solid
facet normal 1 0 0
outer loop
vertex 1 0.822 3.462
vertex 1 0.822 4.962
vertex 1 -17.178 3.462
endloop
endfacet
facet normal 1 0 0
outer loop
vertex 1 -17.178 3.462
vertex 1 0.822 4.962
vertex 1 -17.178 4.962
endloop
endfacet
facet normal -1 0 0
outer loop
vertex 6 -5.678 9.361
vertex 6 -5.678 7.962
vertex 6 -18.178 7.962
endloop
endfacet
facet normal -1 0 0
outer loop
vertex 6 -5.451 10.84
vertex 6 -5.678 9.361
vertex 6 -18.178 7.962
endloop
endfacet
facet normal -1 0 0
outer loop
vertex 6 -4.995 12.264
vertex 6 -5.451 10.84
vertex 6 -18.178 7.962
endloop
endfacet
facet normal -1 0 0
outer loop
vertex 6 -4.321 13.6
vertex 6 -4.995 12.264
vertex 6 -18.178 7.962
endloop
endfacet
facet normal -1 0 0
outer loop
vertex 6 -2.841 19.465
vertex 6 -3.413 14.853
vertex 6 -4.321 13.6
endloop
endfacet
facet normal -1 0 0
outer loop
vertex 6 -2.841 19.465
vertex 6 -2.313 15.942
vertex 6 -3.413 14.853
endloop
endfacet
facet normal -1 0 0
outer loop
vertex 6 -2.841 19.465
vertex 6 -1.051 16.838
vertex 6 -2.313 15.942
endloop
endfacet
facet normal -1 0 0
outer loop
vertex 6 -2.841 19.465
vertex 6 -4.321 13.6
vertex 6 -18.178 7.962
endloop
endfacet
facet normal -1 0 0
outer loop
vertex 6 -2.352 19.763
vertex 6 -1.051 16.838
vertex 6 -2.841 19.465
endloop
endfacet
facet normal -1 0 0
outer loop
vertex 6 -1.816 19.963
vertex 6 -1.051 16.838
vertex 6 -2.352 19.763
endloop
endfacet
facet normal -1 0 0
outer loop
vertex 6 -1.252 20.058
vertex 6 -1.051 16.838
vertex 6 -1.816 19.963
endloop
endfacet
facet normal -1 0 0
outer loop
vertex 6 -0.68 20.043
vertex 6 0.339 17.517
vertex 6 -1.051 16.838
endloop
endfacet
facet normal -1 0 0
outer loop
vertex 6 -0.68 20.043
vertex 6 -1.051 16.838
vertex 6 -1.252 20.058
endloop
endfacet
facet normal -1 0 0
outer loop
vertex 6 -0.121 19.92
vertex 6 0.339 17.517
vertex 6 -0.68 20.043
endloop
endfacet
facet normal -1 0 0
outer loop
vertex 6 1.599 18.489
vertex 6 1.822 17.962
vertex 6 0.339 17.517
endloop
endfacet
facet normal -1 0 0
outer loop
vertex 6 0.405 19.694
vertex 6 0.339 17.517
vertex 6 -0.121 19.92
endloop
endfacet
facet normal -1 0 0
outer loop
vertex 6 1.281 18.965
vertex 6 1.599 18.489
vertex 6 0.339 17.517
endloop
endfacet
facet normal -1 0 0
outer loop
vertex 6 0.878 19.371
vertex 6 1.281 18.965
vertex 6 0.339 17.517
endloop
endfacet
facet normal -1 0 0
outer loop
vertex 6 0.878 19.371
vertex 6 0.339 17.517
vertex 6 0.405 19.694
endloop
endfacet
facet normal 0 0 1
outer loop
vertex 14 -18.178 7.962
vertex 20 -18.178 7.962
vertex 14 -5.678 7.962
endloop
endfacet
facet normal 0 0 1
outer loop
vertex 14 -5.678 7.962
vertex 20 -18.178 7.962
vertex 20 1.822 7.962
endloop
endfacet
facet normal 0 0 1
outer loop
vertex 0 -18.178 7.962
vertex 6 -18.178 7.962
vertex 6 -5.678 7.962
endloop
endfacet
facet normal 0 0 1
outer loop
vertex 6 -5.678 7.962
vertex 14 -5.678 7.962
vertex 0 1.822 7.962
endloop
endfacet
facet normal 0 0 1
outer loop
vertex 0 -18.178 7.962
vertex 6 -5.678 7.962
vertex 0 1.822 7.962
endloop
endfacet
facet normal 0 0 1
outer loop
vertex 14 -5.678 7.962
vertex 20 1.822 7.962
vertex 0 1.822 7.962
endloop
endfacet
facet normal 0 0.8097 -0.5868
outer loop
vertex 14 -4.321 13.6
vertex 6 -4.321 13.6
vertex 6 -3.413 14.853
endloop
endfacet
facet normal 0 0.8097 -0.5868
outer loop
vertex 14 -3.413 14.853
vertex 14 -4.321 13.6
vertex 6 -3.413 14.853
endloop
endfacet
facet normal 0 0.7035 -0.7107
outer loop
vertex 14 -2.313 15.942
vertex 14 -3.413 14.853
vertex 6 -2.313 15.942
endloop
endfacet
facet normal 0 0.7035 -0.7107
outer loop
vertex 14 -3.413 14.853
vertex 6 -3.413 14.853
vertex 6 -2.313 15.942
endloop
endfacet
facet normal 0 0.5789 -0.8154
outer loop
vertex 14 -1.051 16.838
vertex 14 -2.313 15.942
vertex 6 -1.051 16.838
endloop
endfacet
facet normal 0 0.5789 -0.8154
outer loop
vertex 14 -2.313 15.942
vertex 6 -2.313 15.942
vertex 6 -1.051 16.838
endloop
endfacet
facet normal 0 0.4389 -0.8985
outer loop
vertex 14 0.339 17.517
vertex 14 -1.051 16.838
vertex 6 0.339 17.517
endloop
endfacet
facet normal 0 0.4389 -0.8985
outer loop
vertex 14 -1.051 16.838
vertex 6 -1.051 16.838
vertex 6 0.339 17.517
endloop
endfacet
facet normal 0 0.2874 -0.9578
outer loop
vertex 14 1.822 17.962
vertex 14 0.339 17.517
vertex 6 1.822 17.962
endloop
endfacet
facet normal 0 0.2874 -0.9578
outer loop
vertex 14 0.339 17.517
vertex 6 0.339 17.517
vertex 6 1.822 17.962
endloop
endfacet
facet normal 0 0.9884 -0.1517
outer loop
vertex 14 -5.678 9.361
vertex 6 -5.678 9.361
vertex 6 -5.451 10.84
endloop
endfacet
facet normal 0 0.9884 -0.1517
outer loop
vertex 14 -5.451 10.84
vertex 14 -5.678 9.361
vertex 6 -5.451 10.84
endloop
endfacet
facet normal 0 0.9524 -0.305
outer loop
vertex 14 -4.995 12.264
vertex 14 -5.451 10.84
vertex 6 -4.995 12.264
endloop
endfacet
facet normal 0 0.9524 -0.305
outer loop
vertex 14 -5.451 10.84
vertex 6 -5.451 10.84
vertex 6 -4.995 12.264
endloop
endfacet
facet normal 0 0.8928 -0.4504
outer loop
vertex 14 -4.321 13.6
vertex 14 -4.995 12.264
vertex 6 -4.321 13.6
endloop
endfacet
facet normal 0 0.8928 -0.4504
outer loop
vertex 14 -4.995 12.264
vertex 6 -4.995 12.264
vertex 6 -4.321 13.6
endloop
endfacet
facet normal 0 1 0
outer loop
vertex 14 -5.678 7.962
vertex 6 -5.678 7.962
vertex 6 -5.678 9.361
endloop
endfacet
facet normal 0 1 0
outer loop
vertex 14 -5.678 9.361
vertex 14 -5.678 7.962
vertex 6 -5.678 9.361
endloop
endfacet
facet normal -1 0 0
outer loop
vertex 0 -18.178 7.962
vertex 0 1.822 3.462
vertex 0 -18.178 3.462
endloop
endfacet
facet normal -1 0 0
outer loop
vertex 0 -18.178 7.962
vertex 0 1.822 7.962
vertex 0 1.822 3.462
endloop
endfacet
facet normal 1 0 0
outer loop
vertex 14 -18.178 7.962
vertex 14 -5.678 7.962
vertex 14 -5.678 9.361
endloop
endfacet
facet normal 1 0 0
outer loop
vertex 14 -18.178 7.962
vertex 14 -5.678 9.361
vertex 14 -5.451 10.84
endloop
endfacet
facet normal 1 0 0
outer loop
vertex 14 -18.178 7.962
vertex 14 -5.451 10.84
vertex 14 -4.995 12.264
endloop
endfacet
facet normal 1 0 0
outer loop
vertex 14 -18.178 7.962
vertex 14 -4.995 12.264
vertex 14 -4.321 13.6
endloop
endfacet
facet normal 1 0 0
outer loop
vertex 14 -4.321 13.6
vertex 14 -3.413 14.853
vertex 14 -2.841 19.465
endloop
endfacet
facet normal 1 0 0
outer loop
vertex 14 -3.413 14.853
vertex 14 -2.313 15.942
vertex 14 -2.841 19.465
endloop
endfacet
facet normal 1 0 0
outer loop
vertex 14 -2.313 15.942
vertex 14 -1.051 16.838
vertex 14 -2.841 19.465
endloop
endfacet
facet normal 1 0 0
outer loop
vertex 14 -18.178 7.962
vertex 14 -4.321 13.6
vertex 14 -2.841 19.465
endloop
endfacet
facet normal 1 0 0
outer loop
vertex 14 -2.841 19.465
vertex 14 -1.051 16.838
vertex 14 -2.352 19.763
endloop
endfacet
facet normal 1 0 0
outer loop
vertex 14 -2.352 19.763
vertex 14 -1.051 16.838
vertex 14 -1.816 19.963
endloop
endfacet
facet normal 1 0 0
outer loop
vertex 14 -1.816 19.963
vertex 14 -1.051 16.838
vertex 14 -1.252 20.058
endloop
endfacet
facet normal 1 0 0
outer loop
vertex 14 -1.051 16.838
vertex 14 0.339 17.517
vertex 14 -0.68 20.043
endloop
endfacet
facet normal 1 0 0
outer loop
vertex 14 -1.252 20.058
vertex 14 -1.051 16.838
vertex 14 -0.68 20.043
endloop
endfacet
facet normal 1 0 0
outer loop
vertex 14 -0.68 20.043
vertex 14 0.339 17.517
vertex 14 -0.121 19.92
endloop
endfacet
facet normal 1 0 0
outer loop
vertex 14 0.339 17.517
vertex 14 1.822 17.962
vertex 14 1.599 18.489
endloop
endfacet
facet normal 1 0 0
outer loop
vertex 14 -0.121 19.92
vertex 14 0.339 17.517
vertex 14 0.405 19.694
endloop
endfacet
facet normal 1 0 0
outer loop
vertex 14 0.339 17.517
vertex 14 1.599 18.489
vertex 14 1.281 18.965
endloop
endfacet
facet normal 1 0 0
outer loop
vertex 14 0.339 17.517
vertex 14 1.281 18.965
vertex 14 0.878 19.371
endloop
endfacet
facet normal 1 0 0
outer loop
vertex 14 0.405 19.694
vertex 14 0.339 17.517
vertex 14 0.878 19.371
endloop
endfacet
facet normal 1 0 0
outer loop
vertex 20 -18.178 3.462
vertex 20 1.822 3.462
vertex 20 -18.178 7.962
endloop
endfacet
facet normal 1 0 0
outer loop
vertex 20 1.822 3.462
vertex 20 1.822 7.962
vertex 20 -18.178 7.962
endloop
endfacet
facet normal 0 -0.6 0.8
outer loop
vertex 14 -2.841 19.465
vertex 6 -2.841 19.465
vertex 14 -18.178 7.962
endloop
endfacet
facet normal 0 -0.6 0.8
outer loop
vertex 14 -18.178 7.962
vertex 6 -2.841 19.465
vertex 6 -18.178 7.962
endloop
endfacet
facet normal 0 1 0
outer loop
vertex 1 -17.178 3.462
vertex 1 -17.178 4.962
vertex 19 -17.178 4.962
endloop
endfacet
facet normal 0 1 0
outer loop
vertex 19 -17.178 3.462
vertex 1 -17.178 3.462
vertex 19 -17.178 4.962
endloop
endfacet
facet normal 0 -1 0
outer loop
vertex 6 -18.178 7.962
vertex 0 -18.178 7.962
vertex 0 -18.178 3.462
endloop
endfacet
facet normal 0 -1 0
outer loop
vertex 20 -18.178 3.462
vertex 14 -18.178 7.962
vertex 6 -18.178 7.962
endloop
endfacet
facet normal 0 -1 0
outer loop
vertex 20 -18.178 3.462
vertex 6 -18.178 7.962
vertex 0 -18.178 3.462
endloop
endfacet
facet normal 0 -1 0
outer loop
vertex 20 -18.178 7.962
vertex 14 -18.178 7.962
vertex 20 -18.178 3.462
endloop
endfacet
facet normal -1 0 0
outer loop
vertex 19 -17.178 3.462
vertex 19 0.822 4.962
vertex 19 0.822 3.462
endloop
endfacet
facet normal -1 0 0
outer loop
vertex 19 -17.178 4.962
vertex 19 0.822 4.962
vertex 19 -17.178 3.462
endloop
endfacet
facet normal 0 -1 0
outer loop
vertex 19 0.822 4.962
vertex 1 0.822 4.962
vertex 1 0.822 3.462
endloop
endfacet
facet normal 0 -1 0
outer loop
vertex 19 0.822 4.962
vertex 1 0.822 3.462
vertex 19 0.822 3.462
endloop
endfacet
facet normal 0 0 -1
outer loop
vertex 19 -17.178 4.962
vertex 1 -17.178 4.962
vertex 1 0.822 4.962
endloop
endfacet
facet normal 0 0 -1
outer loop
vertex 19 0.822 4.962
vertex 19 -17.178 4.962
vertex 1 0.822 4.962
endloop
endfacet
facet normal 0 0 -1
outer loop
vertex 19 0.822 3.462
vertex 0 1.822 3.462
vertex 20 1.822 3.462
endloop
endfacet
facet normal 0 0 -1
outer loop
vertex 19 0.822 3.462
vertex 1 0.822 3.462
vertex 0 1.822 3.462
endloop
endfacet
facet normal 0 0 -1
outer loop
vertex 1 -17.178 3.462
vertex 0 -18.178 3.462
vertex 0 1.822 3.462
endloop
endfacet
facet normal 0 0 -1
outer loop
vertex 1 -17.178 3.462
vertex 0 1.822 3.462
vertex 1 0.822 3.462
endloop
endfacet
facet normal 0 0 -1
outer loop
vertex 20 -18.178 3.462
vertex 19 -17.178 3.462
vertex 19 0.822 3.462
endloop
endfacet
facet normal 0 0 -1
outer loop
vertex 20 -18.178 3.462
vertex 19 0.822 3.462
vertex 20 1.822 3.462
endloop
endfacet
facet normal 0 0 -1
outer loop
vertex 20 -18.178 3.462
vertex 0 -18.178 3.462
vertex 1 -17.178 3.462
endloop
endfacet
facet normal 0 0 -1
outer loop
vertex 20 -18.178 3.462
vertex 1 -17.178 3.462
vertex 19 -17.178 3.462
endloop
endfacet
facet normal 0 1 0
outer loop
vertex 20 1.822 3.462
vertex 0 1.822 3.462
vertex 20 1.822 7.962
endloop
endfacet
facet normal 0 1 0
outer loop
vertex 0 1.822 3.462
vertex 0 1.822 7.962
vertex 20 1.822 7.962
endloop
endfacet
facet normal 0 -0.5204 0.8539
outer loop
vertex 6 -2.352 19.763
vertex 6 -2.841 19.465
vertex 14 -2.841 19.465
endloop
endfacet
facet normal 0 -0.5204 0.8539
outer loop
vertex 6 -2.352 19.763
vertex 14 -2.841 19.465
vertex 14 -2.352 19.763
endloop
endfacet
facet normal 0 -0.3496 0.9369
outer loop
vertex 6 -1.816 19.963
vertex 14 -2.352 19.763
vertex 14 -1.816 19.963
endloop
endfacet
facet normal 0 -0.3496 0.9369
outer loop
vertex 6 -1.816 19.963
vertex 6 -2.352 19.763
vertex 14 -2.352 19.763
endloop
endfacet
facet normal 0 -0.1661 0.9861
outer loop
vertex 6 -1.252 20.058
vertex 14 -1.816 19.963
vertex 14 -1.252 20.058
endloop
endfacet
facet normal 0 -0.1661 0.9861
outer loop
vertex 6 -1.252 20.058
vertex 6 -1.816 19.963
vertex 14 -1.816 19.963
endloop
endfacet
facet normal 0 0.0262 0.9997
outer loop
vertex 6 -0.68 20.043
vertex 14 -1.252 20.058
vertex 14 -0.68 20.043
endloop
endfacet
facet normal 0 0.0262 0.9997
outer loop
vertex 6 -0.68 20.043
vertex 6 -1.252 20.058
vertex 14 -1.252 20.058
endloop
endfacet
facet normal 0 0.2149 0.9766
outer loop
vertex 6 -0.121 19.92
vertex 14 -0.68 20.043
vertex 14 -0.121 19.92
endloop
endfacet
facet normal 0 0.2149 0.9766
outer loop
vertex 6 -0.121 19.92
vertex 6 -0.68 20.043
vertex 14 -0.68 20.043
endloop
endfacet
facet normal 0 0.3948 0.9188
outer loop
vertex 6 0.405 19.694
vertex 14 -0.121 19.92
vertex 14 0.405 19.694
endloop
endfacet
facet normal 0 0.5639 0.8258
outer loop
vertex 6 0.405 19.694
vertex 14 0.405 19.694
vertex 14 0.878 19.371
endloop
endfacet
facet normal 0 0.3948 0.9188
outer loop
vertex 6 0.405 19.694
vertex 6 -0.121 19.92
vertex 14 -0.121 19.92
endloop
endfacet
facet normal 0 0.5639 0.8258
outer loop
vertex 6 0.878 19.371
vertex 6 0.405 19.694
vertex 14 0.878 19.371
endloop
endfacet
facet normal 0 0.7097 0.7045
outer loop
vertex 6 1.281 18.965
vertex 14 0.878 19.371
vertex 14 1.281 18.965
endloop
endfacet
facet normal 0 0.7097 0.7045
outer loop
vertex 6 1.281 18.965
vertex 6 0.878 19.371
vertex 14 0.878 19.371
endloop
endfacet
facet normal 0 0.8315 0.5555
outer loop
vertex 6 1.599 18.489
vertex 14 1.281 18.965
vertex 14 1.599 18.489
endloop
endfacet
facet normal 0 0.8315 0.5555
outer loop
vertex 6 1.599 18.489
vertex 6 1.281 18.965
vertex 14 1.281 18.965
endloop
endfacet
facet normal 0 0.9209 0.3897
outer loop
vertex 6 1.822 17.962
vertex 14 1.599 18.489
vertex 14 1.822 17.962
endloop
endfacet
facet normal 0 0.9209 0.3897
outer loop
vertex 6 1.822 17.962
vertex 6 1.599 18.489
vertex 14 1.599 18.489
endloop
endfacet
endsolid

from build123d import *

# Parameters (mm, degrees)
F1_DEPTH    = 20
F2_W        = 6
F2_H        = 15
F3_DEPTH    = 20.001
F4_T1_DEPTH = 37.1421356237
F5_W        = 20
F5_H        = 20
F5_W_2      = 18
F5_H_2      = 18
F6_DEPTH    = 1.5


# Not quite as in the source:
# - a fillet or chamfer that OpenCascade refuses, or shapes differently, is made with other operations: its cross-section is extruded or revolved along the edge and cut away or added


with BuildPart() as f1:
    # F0 (on Right) → F1 (new body)
    with BuildSketch(Plane.YZ):
        with BuildLine():
            Line((-18.178238757, 7.9620768987), (-18.178238757, 4.9620768987))
            Line((-18.178238757, 4.9620768987), (1.821761243, 4.9620768987))
            Line((1.821761243, 4.9620768987), (1.821761243, 7.9620768987))
            Line((1.821761243, 7.9620768987), (-5.678238757, 7.9620768987))
            Line((-5.678238757, 7.9620768987), (-5.678238757, 9.3611253762))
            ThreePointArc((-5.678238757, 9.3611253762), (-5.2512465802, 11.5609410366), (-4.321354907, 13.5997673497))
            ThreePointArc((-4.321354907, 13.5997673497), (-1.7002475397, 16.4152583597), (1.821761243, 17.9620768987))
            Line((1.821761243, 17.9620768987), (1.821761243, 22.9620768987))
            Line((1.821761243, 22.9620768987), (-18.178238757, 7.9620768987))
        make_face()
    extrude(amount=F1_DEPTH)

    # F2 (on face) → F3 (cut, through all)
    with BuildSketch(Plane(origin=(0, 1.821761243, 0), x_dir=(-1, 0, 0), z_dir=(0, 1, 0))):
        with Locations((-17, 15.4620768987)):
            Rectangle(F2_W, F2_H)
        with Locations((-3, 15.4620768987)):
            Rectangle(F2_W, F2_H)
    extrude(amount=-F3_DEPTH, mode=Mode.SUBTRACT)

    # F4: fillet of radius 3 on 1 edges, made by hand

    # F4_s2 → F4_t1 (cut)
    with BuildSketch(Plane.YZ.offset(-8.5710678119)):
        with BuildLine():
            ThreePointArc((-2.8409804568, 19.4650206238), (-0.1206191471, 19.9203551155), (1.821761243, 17.9620768987))
            Line((1.821761243, 17.9620768987), (1.821761243, 22.9620768987))
            Line((1.821761243, 22.9620768987), (-2.8409804568, 19.4650206238))
        make_face()
    extrude(amount=F4_T1_DEPTH, mode=Mode.SUBTRACT)

    # F5 (on face) → F6 (join)
    with BuildSketch(Plane(origin=(0, 0, 4.9620768987), x_dir=(1, 0, 0), z_dir=(0, 0, -1))):
        with Locations((10, 8.178238757)):
            Rectangle(F5_W, F5_H)
        with Locations((10, 8.178238757)):
            Rectangle(F5_W_2, F5_H_2, mode=Mode.SUBTRACT)
    extrude(amount=F6_DEPTH)


solid = f1.part
